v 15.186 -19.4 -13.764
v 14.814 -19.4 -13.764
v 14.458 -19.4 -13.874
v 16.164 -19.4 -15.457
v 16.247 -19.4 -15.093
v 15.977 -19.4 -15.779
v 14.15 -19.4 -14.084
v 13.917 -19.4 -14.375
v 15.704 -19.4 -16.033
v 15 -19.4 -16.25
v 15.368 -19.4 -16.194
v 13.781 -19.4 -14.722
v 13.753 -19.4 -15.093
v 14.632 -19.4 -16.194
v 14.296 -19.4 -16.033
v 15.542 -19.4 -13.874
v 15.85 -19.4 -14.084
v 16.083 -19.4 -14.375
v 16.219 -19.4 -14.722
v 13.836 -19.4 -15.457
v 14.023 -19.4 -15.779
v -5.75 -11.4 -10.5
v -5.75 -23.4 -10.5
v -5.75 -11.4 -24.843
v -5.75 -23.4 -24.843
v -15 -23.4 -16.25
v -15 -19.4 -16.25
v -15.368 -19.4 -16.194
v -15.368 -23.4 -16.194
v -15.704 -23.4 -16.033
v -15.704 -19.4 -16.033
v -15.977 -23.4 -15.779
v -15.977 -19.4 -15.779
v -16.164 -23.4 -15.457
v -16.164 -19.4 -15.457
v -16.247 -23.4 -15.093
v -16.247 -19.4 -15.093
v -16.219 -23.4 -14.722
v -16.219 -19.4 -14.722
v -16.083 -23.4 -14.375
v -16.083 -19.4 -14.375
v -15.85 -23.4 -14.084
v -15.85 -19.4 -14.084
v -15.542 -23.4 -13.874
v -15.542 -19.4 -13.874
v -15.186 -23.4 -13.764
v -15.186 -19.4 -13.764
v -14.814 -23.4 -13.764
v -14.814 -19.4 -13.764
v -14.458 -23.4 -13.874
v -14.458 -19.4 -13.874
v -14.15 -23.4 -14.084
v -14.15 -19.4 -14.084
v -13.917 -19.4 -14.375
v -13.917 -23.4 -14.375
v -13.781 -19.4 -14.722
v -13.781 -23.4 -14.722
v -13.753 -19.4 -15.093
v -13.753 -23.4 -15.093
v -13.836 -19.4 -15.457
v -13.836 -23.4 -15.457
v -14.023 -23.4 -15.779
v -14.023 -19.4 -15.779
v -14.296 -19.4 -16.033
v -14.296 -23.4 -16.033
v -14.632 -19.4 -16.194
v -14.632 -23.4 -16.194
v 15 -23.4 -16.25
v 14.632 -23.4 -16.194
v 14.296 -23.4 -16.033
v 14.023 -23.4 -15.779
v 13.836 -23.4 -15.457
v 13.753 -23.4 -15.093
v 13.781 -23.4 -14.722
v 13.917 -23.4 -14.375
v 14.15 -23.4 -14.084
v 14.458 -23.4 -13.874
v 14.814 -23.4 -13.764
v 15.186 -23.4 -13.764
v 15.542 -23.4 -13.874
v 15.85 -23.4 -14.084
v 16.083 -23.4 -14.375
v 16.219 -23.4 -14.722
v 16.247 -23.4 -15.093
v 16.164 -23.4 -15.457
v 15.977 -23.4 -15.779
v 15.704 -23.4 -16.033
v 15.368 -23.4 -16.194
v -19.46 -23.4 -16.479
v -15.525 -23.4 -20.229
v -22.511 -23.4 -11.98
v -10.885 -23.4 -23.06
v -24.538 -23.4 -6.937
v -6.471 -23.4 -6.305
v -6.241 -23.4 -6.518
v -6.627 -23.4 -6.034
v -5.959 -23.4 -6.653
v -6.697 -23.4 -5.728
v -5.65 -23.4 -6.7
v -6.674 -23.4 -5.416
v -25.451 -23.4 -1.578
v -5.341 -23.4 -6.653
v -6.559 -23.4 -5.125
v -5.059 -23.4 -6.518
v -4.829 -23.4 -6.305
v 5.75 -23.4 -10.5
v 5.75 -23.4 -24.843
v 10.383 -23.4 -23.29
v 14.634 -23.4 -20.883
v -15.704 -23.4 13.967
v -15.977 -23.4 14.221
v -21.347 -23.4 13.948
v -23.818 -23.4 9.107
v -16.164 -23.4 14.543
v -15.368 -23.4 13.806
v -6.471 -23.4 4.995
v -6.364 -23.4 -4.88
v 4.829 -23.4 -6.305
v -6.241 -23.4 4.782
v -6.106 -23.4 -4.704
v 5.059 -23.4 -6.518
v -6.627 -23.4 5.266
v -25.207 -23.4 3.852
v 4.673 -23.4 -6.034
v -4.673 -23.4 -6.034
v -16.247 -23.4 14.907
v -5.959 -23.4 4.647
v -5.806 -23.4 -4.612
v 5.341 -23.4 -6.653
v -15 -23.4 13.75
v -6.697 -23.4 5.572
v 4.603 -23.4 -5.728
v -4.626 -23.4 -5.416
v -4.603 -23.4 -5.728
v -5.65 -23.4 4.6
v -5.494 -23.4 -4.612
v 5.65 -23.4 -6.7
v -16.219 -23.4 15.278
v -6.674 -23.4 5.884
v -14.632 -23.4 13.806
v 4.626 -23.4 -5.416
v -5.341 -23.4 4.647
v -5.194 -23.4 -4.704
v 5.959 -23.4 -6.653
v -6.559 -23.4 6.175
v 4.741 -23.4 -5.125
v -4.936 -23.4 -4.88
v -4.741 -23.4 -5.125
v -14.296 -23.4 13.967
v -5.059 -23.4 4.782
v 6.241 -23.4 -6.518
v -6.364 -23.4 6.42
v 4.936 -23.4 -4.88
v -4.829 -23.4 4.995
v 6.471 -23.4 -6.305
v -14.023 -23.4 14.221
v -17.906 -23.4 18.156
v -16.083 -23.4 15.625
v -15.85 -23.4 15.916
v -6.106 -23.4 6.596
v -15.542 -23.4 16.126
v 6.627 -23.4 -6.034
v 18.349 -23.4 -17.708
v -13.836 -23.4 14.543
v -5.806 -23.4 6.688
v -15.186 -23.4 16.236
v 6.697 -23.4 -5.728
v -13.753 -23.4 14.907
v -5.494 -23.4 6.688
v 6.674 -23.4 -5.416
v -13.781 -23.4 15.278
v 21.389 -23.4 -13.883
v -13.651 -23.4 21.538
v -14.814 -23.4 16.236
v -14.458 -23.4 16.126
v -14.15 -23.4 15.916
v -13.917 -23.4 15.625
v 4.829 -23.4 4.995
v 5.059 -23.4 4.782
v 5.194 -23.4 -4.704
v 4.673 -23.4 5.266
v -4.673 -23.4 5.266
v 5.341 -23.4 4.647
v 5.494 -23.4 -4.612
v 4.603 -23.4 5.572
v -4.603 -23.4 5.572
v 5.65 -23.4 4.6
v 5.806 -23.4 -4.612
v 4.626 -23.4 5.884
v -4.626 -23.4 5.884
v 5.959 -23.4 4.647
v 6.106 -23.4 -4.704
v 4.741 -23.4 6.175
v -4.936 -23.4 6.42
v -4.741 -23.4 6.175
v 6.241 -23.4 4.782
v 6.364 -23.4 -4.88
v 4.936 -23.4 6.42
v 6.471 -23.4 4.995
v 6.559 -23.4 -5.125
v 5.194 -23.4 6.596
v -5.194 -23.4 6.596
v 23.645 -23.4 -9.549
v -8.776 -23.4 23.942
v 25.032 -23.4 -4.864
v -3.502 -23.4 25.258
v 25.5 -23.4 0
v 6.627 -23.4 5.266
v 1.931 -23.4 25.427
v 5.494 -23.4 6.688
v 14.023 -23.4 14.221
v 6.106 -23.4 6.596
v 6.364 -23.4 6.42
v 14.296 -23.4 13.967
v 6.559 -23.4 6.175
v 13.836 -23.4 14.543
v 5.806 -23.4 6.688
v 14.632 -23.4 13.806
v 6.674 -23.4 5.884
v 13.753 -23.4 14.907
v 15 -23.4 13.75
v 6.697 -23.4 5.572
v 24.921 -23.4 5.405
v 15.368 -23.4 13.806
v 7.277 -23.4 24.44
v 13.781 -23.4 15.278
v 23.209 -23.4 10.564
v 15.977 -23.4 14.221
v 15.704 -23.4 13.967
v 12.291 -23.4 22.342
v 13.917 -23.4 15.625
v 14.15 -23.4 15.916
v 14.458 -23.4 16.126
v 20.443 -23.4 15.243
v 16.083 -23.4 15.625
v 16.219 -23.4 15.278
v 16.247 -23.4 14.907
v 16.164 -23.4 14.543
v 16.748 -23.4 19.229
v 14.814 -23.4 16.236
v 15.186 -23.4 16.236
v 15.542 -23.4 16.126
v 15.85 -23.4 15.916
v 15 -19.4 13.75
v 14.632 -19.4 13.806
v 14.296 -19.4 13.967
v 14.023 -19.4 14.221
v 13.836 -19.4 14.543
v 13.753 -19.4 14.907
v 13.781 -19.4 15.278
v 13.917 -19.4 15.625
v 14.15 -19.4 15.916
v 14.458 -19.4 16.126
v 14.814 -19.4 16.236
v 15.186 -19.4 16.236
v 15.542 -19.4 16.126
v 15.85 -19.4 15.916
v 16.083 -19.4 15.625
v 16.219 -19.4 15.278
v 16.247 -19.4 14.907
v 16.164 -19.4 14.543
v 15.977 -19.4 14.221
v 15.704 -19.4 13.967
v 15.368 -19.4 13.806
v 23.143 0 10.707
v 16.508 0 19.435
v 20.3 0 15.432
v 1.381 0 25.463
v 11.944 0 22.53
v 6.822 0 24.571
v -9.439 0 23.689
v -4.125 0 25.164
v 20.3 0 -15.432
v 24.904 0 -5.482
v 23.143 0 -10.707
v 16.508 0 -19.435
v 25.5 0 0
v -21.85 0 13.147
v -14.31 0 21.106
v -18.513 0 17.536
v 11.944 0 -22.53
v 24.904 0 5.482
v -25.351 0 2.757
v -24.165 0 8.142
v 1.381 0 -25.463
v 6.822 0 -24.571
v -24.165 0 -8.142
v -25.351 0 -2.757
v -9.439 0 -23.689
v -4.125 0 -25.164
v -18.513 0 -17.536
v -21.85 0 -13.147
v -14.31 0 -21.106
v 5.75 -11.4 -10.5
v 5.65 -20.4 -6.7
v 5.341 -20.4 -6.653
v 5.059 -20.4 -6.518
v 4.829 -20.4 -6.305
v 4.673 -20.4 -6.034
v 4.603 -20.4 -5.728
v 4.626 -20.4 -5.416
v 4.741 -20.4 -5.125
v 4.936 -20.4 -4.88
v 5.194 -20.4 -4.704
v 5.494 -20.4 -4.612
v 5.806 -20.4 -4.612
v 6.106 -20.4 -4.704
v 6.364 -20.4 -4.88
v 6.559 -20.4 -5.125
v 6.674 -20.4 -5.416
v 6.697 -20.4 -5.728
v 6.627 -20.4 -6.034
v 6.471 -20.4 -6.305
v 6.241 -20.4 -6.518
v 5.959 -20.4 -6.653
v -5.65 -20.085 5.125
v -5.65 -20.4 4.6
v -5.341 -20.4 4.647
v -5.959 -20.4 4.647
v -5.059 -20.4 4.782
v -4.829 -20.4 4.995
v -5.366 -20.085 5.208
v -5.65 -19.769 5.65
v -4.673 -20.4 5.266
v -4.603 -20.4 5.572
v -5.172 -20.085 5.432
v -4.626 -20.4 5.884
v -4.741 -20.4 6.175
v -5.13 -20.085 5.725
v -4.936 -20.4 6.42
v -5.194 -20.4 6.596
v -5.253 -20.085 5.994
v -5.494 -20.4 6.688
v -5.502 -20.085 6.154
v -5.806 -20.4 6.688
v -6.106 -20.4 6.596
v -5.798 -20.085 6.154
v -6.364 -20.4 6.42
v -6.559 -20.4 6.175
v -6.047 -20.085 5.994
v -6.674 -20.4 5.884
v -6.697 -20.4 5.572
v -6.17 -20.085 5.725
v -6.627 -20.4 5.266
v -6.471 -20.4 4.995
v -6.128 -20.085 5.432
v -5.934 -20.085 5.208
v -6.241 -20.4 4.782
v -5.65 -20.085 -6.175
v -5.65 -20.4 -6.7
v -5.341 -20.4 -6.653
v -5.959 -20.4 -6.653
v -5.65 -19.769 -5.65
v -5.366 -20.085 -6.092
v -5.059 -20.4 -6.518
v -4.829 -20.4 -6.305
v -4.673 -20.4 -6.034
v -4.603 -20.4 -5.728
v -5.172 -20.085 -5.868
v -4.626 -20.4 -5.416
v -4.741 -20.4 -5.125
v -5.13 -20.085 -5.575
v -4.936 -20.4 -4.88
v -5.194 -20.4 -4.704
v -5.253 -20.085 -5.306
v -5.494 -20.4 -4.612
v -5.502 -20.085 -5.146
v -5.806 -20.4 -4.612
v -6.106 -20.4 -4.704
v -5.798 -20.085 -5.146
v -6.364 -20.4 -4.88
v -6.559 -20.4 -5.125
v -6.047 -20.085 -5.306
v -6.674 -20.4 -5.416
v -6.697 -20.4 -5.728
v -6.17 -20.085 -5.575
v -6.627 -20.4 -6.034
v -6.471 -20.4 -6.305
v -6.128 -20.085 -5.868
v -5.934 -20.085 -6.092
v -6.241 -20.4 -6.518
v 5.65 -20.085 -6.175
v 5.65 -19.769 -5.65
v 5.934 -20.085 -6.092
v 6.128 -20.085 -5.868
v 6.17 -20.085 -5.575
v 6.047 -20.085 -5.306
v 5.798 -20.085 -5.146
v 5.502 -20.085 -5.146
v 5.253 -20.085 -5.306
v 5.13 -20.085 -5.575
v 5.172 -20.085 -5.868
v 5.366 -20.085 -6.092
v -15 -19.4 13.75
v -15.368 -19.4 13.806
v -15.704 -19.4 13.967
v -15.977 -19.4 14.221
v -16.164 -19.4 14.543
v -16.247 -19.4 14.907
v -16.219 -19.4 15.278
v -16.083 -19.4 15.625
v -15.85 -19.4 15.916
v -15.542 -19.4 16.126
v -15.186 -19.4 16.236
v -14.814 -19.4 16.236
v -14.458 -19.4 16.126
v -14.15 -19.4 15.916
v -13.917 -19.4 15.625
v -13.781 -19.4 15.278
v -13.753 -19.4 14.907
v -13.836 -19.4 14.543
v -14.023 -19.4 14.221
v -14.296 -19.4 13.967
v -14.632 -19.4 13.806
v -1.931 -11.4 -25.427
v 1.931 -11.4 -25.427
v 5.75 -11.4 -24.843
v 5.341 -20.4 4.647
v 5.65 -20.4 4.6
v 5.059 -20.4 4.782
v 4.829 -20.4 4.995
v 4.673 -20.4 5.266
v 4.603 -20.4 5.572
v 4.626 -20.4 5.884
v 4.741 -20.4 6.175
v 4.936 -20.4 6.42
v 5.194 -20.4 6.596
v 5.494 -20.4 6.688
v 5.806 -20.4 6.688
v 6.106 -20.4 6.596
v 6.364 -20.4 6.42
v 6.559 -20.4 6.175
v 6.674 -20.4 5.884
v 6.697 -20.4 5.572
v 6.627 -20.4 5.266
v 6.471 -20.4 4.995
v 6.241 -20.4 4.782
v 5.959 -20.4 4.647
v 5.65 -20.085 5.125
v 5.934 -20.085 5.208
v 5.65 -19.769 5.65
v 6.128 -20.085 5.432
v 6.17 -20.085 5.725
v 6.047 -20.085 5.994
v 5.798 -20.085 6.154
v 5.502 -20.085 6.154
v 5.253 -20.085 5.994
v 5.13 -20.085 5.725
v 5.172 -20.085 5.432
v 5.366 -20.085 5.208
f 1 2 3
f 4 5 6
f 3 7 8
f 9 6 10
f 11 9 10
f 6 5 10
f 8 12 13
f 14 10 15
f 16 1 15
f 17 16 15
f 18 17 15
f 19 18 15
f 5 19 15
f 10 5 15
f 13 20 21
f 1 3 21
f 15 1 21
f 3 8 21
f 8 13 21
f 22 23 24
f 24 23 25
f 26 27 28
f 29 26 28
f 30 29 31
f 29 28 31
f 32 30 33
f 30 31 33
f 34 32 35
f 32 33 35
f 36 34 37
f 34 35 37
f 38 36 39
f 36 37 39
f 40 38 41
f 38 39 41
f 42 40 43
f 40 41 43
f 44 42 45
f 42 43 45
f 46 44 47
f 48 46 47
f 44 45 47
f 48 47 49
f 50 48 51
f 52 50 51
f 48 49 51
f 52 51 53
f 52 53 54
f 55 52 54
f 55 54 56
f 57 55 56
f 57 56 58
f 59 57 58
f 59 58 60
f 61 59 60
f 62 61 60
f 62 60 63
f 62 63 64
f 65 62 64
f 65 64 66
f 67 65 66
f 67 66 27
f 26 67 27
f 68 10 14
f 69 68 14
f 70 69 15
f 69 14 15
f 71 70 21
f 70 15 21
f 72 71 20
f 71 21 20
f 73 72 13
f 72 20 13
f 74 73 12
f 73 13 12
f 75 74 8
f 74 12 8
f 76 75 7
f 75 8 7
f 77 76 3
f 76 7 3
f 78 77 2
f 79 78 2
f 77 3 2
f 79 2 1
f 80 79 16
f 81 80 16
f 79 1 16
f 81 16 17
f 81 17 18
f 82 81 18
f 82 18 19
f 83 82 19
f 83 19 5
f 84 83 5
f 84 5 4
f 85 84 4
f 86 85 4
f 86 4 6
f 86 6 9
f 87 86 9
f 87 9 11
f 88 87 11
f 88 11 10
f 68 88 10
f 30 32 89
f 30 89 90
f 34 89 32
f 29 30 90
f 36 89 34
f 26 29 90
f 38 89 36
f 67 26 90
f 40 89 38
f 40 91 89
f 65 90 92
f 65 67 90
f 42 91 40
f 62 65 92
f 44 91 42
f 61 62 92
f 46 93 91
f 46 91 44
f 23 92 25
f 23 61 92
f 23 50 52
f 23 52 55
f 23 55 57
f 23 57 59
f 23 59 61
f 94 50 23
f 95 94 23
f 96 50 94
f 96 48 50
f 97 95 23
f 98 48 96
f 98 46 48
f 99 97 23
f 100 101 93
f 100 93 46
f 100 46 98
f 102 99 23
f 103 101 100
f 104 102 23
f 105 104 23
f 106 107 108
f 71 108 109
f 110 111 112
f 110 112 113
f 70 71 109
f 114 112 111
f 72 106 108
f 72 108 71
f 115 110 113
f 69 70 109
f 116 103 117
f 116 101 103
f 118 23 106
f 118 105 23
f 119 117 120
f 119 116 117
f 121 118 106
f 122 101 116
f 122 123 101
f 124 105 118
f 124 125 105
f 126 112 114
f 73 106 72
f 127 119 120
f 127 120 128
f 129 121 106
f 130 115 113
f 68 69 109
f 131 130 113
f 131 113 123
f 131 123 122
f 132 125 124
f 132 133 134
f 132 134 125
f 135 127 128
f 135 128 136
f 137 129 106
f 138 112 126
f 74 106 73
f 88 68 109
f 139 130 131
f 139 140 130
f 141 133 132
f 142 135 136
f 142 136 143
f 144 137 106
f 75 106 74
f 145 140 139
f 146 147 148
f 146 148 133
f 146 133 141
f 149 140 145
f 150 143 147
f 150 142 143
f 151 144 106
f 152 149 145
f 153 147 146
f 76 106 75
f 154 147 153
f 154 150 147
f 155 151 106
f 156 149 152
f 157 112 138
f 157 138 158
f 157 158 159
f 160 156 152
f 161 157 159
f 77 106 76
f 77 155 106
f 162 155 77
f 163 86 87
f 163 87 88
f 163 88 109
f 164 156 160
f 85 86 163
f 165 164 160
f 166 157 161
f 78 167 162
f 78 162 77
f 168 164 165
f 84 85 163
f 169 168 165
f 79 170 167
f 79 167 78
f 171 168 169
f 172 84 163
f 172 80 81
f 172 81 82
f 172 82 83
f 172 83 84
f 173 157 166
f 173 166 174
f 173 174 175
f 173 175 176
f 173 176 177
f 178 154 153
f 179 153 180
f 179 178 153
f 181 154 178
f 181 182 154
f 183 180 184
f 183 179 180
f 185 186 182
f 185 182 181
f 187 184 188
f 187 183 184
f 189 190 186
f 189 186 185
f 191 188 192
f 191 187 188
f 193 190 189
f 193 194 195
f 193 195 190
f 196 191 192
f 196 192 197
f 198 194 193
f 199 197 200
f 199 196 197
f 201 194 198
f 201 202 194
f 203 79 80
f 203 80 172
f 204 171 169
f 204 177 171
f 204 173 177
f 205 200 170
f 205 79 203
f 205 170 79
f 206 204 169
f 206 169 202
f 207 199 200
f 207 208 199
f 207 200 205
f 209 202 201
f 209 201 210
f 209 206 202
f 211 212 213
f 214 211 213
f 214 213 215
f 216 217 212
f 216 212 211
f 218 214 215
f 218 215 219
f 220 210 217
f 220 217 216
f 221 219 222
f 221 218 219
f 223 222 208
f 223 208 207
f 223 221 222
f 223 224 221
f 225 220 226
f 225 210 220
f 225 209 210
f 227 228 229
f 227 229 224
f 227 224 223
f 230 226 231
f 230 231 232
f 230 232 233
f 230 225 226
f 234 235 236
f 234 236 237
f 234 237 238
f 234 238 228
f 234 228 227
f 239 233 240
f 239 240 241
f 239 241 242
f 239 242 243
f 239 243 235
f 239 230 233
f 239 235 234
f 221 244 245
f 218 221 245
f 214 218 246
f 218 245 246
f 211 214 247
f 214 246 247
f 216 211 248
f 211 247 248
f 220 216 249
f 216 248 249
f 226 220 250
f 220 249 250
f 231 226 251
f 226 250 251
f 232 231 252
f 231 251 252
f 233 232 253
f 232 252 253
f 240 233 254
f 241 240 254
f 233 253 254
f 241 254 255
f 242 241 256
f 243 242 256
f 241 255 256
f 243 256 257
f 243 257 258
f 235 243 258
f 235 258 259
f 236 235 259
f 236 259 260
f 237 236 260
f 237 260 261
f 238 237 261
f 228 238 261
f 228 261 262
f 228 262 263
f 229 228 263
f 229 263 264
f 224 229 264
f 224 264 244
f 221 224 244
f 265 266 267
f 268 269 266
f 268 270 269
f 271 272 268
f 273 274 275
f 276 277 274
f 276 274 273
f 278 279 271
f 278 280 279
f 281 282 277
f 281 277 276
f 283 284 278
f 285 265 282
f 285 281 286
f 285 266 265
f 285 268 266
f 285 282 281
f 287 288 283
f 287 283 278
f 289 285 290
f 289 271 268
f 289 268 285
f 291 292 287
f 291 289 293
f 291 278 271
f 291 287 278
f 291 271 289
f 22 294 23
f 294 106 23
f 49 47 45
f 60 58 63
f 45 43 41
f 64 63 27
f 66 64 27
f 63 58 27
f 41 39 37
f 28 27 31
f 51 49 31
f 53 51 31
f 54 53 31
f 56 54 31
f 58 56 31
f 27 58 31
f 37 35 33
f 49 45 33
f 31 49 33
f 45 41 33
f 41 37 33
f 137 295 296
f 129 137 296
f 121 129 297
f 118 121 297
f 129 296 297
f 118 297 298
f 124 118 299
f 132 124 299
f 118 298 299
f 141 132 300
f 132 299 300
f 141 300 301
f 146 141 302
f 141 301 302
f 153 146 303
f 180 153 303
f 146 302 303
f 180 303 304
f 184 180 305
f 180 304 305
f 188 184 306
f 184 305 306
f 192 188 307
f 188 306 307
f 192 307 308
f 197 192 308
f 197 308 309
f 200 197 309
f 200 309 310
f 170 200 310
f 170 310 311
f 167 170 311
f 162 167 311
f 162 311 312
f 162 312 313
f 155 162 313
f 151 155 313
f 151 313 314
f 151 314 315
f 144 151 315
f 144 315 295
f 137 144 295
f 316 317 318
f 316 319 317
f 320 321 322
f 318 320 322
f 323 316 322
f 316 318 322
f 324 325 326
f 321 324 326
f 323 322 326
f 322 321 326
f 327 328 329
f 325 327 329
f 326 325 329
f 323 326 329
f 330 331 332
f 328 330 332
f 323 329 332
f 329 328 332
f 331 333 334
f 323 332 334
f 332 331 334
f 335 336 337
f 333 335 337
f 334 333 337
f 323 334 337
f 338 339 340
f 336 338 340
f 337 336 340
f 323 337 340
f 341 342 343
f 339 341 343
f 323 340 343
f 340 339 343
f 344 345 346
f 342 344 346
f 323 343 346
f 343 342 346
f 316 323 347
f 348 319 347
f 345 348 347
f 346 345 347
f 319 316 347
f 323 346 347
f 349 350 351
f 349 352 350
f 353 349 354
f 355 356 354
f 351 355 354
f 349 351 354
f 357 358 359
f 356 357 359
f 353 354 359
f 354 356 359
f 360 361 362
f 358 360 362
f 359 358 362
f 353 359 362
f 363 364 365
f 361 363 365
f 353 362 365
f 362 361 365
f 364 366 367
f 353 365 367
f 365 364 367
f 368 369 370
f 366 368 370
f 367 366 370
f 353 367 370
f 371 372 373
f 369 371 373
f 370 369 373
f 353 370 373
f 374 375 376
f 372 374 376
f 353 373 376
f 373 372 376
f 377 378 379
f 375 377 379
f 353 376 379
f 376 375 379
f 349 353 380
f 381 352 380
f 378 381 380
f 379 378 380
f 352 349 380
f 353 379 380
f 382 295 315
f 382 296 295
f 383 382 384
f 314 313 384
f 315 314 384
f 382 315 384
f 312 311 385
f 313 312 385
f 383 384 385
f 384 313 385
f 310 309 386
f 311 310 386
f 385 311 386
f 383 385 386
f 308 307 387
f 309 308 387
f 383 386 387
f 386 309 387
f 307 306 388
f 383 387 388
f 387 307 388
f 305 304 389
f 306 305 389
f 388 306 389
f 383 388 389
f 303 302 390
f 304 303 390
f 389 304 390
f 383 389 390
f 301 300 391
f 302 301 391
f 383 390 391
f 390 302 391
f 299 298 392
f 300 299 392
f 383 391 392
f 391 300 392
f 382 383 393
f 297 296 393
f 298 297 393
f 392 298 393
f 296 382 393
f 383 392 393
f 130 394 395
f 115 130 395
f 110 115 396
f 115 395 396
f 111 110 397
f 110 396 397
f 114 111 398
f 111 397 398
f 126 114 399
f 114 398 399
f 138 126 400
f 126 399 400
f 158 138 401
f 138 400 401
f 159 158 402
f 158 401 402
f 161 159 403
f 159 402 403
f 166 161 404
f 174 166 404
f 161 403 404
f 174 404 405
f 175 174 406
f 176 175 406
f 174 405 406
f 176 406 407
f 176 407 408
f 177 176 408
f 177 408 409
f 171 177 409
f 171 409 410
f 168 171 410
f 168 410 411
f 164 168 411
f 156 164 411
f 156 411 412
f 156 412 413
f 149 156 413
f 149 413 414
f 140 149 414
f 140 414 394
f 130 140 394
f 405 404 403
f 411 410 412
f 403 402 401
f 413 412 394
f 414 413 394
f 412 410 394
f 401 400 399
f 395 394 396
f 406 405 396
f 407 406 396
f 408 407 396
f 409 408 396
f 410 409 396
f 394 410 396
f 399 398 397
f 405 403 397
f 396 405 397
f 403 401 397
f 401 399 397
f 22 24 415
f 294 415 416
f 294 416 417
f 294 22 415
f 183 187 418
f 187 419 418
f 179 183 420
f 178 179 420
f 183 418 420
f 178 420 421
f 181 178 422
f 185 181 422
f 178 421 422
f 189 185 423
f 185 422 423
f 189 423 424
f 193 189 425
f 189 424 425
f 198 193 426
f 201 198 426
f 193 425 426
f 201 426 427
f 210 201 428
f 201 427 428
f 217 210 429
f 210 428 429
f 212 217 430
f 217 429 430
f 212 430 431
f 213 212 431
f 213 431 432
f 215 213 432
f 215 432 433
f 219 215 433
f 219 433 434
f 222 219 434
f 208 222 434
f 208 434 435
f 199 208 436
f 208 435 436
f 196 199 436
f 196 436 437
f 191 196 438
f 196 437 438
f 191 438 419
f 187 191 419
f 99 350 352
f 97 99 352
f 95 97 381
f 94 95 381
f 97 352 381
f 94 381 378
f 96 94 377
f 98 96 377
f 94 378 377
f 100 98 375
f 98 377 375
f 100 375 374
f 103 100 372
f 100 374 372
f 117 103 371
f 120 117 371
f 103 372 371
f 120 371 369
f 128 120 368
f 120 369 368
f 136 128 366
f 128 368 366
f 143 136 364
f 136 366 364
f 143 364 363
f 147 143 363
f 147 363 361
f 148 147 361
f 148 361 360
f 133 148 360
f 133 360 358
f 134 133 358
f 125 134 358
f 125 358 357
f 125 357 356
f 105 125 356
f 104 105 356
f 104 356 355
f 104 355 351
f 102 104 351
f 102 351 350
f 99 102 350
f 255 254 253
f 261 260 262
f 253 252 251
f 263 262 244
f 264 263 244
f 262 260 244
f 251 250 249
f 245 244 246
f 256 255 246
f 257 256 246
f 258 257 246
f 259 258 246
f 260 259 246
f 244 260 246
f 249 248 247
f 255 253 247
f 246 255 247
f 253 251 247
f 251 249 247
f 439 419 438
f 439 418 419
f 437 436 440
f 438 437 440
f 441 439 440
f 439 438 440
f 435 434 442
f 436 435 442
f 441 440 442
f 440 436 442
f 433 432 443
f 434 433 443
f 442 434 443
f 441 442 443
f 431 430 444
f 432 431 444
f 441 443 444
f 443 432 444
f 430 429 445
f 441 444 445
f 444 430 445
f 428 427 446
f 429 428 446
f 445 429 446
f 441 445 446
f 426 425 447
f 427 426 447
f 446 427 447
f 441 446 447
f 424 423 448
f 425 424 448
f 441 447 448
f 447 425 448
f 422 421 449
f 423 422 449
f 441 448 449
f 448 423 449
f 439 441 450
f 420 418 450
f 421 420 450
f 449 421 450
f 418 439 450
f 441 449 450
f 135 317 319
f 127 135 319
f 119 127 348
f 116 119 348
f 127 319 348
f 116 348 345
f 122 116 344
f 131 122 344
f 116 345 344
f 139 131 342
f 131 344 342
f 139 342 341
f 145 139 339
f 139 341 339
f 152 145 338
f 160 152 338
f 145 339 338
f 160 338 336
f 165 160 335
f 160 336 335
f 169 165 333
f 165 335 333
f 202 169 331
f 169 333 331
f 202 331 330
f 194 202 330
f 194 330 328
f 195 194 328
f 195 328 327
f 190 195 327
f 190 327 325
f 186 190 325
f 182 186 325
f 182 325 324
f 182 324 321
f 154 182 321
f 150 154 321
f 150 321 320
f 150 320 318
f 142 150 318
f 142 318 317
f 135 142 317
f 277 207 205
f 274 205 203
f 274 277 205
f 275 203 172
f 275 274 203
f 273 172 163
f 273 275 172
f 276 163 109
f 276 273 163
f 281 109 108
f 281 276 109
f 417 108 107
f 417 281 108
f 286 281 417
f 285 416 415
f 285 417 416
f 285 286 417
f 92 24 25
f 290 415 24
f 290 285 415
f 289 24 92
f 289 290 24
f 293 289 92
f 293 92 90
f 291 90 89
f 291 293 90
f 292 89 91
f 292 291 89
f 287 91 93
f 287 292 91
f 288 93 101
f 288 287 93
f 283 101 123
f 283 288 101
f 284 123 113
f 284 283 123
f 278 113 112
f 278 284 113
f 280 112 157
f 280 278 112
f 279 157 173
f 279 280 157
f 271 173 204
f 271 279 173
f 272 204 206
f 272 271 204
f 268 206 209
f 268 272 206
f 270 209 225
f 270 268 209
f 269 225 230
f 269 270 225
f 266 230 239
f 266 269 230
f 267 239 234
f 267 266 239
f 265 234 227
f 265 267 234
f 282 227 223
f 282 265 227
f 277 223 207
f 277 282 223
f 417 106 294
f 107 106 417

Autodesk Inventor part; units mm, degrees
ref_plane "YZ Plane" through (0, 0, 0) normal (1, 0, 0) x (0, 1, 0)
sketch "Sketch1" plane through (0, 0, 0) normal (0, 1, 0) x (-1, 0, 0)
  circle A0 centre (0, 0) radius 32.5
  dimension "d0" = 65
extrude "Extrusion1" add sketch "Sketch1" along normal blind 38.5
sketch "Sketch2" plane through (0, 0, 0) normal (0, -1, 0) x (1, 0, 0)
  circle A0 centre (0, 0) radius 25.5
  dimension "d3" = 51
extrude "Extrusion2" add sketch "Sketch2" along normal blind 23.4
chamfer "Chamfer1" distance 3 angle 45 2 edges at (32.5, 38.5, 0) (32.5, 0, 0)
sketch "Sketch3" plane through (0, -23.4, 0) normal (0, -1, 0) x (1, 0, 0)
  line L0 (0, 0) -> (0, -10.5) construction
  circle A0 centre (0, 0) radius 25.5 projected
  line L1 (0, -10.5) -> (5.75, -10.5)
  line L2 (5.75, -10.5) -> (5.75, -24.8433)
  line L3 (0, -10.5) -> (-5.75, -10.5)
  line L4 (-5.75, -10.5) -> (-5.75, -24.8433)
  line L5 (5.75, -24.8433) -> (-5.75, -24.8433)
  line L6 (-15, 15) -> (15, 15) construction
  line L7 (15, 15) -> (15, -15) construction
  line L8 (15, -15) -> (-15, -15) construction
  line L9 (-15, -15) -> (-15, 15) construction
  line L10 (-15, 15) -> (15, -15) construction
  line L11 (15, 15) -> (-15, -15) construction
  line L12 (5.65, 5.65) -> (-5.65, 5.65) construction
  line L13 (-5.65, 5.65) -> (-5.65, -5.65) construction
  line L14 (-5.65, -5.65) -> (5.65, -5.65) construction
  line L15 (5.65, -5.65) -> (5.65, 5.65) construction
  line L16 (5.65, 5.65) -> (-5.65, -5.65) construction
  line L17 (-5.65, 5.65) -> (5.65, -5.65) construction
  dimension "d10" = 10.5
  dimension "d14" = 5.75
  dimension "d15" = 5.75
  dimension "d16" = 30
  dimension "d17" = 30
  dimension "d35" = 11.3
  dimension "d36" = 11.3
hole "Hole1" at (15, -23.4, -15) at (-15, -23.4, -15) at (15, -23.4, 15) at (-15, -23.4, 15) direction (0, 1, 0) diameter 2.5 depth 4
thread "Thread1" size "M2.5x0.45" class "6H" standard "ANSI Metric M Profile" full length
thread "Thread2" size "M2.5x0.45" class "6H" standard "ANSI Metric M Profile" full length
thread "Thread3" size "M2.5x0.45" class "6H" standard "ANSI Metric M Profile" full length
thread "Thread4" size "M2.5x0.45" class "6H" standard "ANSI Metric M Profile" full length
extrude "Extrusion3" cut sketch "Sketch3" against normal blind 12 contours L5 A0 | L4 L3 L1 L2 L5
hole "Hole2" at (5.65, -23.4, 5.65) at (5.65, -23.4, -5.65) at (-5.65, -23.4, 5.65) at (-5.65, -23.4, -5.65) direction (0, 1, 0) diameter 2.1 depth 3 tip angle 118
thread "Thread5" size "M2.5x0.45" class "6H" standard "ANSI Metric M Profile" full length
thread "Thread6" size "M2.2x0.45" class "6H" standard "ANSI Metric M Profile" full length
thread "Thread7" size "M2.2x0.45" class "6H" standard "ANSI Metric M Profile" full length
thread "Thread8" size "M2.2x0.45" class "6H" standard "ANSI Metric M Profile" full length
ref_plane "Work Plane1" through (0, 0, -32.5) normal (0, 0, -1) x (-1, 0, 0)
sketch "Sketch4" plane through (0, 0, -32.5) normal (0, 0, -1) x (-1, 0, 0)
  line L0 (-25.5, -23.4) -> (25.5, -23.4) projected
  line L1 (-32.5, 3) -> (32.5, 3) projected
  line L2 (32.5, 35.5) -> (-32.5, 35.5) projected
  line L3 (0, -23.4) -> (0, 18.1) construction
  line L4 (32.5, 3) -> (32.5, 35.5) projected
  line L5 (-32.5, 3) -> (-32.5, 35.5) projected
  line L6 (-32.5, 17.6) -> (32.5, 17.6)
  line L7 (32.5, 17.6) -> (32.5, 18.6)
  line L8 (32.5, 18.6) -> (-32.5, 18.6)
  line L9 (-32.5, 18.6) -> (-32.5, 17.6)
  line L10 (-32.5, 17.6) -> (32.5, 18.6) construction
  line L11 (32.5, 17.6) -> (-32.5, 18.6) construction
  line L12 (-20, 18.1) -> (20, 18.1) construction
  line L13 (-20, 9.1) -> (20, 9.1)
  line L14 (20, 27.1) -> (-20, 27.1)
  arc A0 (-20, 27.1) -> (-20, 9.1) centre (-20, 18.1) ccw
  arc A1 (20, 9.1) -> (20, 27.1) centre (20, 18.1) ccw
  line L15 (0, 18.1) -> (-15, 18.1)
  line L16 (0, 18.1) -> (15, 18.1)
  circle A2 centre (-15, 18.1) radius 6.35
  circle A3 centre (15, 18.1) radius 6.35
  line L17 (-20, 25.6) -> (20, 25.6)
  arc A4 (20, 10.6) -> (20, 25.6) centre (20, 18.1) ccw
  line L18 (20, 10.6) -> (-20, 10.6)
  arc A5 (-20, 25.6) -> (-20, 10.6) centre (-20, 18.1) ccw
  point P0 (0, 0)
  point P1 (-5.75, -23.4)
  point P2 (5.75, -23.4)
  dimension "d52" = 41.5
  dimension "d53" = 1
  dimension "d54" = 20
  dimension "d55" = 18
  dimension "d56" = 15
  dimension "d57" = 15
  dimension "d58" = 12.7
  dimension "d59" = 12.7
  dimension "d64" = 1.5
extrude "Extrusion5" cut sketch "Sketch4" against normal blind 15 contours A2 L8 L6 | L6 A2 | A3 L6 | L6 A3 L8 | A2 L8 | L8 A3
sketch "Sketch5" plane through (0, 0, 0) normal (1, 0, 0) x (0, 1, 0)
  line L0 (3, -32.5) -> (35.5, -32.5) projected
  line L1 (18.6, -33) -> (17.6, -33)
  line L2 (17.6, -33) -> (17.6, -32)
  line L3 (17.6, -32) -> (18.6, -32)
  line L4 (18.6, -32) -> (18.6, -33)
  line L5 (18.6, -33) -> (17.6, -32) construction
  line L6 (17.6, -33) -> (18.6, -32) construction
  line L7 (-35.78, 0) -> (50.88, 0) projected
  point P0 (0, 0)
  point P1 (18.1, -32.5)
  point P2 (18.1, -32.5)
  point P3 (18.1, -32.5)
  dimension "d67" = 1
  dimension "d68" = 1
revolve "Revolution1" cut sketch "Sketch5" angle 360 about axis through (0, -10, 0) along (0, 1, 0)
ref_plane "Work Plane2" through (0, 0, 0) normal (0, -1, 0) x (1, 0, 0)
split "Split1" plane through (0, 0, 0) removes the side toward (0, 1, 0)
sketch "Sketch6" plane through (0, 0, 0) normal (0, 1, 0) x (1, 0, 0)
  point P0 (0, 0)
properties part number "SweepV0.991_BASE_Rev.1" material "LCP Plastic"
